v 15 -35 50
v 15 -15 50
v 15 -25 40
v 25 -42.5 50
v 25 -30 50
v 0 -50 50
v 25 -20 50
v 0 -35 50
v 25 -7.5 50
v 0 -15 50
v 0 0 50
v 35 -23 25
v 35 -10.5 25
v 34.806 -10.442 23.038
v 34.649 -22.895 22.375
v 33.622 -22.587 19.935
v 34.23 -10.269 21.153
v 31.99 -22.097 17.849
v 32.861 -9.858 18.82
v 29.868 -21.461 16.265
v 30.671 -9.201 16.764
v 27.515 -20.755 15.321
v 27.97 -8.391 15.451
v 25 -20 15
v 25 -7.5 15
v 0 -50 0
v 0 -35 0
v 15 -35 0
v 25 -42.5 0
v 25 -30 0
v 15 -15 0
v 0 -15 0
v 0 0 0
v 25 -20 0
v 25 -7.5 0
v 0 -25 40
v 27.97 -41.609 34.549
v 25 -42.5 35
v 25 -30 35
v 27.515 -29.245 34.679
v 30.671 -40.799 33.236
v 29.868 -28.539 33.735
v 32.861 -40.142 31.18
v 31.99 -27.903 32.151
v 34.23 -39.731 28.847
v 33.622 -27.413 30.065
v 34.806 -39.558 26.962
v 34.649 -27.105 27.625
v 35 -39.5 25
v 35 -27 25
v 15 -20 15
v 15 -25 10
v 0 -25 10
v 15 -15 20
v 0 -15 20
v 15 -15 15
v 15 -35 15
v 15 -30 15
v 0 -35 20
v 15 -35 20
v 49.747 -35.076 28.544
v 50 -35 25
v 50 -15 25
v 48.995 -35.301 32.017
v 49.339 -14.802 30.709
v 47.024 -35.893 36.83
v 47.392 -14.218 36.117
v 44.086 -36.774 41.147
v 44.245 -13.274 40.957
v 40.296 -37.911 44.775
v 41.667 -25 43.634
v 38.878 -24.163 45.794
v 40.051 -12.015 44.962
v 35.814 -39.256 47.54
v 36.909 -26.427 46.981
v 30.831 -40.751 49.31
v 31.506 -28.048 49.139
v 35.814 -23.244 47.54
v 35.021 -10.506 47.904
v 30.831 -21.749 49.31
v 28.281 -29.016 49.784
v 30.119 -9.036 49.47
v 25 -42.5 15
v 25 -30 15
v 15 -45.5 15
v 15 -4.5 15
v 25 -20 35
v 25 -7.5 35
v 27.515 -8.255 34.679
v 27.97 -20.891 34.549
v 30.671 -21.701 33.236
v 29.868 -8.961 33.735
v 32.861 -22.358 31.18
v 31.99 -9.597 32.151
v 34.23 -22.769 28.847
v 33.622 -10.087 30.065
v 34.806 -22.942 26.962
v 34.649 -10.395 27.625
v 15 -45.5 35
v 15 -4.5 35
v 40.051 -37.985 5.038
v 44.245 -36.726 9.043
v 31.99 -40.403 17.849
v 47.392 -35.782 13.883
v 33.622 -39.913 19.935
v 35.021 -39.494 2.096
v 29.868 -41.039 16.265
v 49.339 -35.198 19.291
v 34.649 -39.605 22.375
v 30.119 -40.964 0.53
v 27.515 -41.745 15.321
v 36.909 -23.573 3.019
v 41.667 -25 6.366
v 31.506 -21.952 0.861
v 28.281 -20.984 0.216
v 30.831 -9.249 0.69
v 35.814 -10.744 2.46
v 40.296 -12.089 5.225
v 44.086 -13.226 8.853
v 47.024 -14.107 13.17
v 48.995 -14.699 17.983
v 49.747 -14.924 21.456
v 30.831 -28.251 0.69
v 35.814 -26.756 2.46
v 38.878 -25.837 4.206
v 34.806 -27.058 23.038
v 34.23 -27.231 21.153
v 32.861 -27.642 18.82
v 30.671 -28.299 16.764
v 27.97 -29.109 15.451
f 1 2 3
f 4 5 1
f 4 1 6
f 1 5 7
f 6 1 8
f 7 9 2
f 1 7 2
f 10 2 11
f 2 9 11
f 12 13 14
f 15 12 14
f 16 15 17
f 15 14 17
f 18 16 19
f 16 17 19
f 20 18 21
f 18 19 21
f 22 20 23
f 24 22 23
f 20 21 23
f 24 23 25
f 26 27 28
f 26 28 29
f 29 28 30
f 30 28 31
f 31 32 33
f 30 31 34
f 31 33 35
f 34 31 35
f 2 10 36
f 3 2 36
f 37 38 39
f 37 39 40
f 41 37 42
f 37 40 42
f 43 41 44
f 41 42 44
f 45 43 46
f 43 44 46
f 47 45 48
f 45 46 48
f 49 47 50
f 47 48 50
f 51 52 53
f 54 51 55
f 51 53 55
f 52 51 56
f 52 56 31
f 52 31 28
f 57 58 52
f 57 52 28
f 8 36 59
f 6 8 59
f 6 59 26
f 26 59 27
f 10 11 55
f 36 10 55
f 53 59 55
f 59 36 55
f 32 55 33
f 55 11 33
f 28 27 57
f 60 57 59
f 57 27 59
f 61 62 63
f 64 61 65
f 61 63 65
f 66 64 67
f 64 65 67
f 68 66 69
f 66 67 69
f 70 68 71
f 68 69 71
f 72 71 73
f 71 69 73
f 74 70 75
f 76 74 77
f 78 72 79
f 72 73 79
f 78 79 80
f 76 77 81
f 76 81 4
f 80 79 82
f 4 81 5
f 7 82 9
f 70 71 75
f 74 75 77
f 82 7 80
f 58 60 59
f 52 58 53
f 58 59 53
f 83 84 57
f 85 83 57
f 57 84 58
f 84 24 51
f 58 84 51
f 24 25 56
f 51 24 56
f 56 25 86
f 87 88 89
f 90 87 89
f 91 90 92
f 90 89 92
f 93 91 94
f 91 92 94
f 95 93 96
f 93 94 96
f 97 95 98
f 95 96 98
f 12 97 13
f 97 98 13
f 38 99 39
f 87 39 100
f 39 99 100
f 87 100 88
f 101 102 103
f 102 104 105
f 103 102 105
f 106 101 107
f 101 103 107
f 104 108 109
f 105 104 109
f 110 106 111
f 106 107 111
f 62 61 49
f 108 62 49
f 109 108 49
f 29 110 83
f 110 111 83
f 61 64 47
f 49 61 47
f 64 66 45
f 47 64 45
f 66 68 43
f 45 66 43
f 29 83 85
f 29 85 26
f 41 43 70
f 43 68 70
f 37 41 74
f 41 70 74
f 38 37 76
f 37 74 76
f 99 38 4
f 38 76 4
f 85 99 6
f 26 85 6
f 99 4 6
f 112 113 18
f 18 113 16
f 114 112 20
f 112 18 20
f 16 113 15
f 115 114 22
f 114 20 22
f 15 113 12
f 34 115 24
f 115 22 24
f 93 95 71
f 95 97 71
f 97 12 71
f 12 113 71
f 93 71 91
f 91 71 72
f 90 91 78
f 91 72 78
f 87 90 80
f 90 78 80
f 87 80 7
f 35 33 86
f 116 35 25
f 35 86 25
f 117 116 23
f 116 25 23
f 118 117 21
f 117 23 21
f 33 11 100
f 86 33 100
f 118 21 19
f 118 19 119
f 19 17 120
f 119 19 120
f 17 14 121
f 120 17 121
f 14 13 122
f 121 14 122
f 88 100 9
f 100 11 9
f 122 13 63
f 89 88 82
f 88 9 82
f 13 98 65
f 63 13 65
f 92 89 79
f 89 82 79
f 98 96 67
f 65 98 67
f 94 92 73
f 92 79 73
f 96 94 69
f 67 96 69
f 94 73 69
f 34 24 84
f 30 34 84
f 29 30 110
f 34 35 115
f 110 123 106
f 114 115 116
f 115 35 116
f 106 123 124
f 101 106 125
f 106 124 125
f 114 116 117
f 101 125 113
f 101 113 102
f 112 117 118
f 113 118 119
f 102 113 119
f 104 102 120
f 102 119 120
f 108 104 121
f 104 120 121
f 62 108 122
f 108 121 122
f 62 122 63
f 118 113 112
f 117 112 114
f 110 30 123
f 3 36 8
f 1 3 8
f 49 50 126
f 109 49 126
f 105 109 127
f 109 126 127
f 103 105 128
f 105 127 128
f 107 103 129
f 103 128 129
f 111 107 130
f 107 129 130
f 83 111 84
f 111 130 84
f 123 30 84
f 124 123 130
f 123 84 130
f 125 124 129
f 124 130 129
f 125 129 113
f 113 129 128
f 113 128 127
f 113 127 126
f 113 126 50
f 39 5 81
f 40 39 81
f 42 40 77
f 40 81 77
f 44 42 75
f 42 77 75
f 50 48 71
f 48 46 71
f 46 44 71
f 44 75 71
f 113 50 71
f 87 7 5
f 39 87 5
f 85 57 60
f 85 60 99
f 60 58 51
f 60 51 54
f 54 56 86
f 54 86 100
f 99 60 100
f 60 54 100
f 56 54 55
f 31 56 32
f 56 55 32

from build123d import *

# Parameters (mm, degrees)
F1_DEPTH = 50
F3_DEPTH = 15
F6_DEPTH = 50


with BuildPart() as f1:
    # F0 (on Front) → F1 (new body)
    with BuildSketch(Plane.XZ):
        with BuildLine():
            Line((25, 50), (0, 50))
            Line((0, 50), (0, 0))
            Line((0, 0), (25, 0))
            ThreePointArc((25, 0), (42.6776695297, 7.3223304703), (50, 25))
            ThreePointArc((50, 25), (42.6776695297, 42.6776695297), (25, 50))
        make_face()
        with BuildLine():
            Line((25, 15), (15, 15))
            Line((15, 15), (15, 35))
            Line((15, 35), (25, 35))
            ThreePointArc((25, 35), (32.0710678119, 32.0710678119), (35, 25))
            ThreePointArc((35, 25), (32.0710678119, 17.9289321881), (25, 15))
        make_face(mode=Mode.SUBTRACT)
    extrude(amount=F1_DEPTH)

    # F2 (on face) → F3 (cut)
    with BuildSketch(Plane(origin=(0, 0, 0), x_dir=(0, -1, 0), z_dir=(-1, 0, 0))):
        Polygon((15, 20), (15, 0), (35, 0), (35, 20), (25, 10), align=None)
        Polygon((35, 50), (15, 50), (25, 40), align=None)
    extrude(amount=-F3_DEPTH, mode=Mode.SUBTRACT)

    # F5 (on offset) → F6 (cut)
    with BuildSketch(Plane.XY.offset(50)):
        Polygon((41.6666666667, -25), (25, -20), (25, -30), align=None)
        Polygon((50, -50), (50, -35), (0, -50), align=None)
        Polygon((0, 0), (50, -15), (50, 0), align=None)
    extrude(amount=-F6_DEPTH, mode=Mode.SUBTRACT)


solid = f1.part
